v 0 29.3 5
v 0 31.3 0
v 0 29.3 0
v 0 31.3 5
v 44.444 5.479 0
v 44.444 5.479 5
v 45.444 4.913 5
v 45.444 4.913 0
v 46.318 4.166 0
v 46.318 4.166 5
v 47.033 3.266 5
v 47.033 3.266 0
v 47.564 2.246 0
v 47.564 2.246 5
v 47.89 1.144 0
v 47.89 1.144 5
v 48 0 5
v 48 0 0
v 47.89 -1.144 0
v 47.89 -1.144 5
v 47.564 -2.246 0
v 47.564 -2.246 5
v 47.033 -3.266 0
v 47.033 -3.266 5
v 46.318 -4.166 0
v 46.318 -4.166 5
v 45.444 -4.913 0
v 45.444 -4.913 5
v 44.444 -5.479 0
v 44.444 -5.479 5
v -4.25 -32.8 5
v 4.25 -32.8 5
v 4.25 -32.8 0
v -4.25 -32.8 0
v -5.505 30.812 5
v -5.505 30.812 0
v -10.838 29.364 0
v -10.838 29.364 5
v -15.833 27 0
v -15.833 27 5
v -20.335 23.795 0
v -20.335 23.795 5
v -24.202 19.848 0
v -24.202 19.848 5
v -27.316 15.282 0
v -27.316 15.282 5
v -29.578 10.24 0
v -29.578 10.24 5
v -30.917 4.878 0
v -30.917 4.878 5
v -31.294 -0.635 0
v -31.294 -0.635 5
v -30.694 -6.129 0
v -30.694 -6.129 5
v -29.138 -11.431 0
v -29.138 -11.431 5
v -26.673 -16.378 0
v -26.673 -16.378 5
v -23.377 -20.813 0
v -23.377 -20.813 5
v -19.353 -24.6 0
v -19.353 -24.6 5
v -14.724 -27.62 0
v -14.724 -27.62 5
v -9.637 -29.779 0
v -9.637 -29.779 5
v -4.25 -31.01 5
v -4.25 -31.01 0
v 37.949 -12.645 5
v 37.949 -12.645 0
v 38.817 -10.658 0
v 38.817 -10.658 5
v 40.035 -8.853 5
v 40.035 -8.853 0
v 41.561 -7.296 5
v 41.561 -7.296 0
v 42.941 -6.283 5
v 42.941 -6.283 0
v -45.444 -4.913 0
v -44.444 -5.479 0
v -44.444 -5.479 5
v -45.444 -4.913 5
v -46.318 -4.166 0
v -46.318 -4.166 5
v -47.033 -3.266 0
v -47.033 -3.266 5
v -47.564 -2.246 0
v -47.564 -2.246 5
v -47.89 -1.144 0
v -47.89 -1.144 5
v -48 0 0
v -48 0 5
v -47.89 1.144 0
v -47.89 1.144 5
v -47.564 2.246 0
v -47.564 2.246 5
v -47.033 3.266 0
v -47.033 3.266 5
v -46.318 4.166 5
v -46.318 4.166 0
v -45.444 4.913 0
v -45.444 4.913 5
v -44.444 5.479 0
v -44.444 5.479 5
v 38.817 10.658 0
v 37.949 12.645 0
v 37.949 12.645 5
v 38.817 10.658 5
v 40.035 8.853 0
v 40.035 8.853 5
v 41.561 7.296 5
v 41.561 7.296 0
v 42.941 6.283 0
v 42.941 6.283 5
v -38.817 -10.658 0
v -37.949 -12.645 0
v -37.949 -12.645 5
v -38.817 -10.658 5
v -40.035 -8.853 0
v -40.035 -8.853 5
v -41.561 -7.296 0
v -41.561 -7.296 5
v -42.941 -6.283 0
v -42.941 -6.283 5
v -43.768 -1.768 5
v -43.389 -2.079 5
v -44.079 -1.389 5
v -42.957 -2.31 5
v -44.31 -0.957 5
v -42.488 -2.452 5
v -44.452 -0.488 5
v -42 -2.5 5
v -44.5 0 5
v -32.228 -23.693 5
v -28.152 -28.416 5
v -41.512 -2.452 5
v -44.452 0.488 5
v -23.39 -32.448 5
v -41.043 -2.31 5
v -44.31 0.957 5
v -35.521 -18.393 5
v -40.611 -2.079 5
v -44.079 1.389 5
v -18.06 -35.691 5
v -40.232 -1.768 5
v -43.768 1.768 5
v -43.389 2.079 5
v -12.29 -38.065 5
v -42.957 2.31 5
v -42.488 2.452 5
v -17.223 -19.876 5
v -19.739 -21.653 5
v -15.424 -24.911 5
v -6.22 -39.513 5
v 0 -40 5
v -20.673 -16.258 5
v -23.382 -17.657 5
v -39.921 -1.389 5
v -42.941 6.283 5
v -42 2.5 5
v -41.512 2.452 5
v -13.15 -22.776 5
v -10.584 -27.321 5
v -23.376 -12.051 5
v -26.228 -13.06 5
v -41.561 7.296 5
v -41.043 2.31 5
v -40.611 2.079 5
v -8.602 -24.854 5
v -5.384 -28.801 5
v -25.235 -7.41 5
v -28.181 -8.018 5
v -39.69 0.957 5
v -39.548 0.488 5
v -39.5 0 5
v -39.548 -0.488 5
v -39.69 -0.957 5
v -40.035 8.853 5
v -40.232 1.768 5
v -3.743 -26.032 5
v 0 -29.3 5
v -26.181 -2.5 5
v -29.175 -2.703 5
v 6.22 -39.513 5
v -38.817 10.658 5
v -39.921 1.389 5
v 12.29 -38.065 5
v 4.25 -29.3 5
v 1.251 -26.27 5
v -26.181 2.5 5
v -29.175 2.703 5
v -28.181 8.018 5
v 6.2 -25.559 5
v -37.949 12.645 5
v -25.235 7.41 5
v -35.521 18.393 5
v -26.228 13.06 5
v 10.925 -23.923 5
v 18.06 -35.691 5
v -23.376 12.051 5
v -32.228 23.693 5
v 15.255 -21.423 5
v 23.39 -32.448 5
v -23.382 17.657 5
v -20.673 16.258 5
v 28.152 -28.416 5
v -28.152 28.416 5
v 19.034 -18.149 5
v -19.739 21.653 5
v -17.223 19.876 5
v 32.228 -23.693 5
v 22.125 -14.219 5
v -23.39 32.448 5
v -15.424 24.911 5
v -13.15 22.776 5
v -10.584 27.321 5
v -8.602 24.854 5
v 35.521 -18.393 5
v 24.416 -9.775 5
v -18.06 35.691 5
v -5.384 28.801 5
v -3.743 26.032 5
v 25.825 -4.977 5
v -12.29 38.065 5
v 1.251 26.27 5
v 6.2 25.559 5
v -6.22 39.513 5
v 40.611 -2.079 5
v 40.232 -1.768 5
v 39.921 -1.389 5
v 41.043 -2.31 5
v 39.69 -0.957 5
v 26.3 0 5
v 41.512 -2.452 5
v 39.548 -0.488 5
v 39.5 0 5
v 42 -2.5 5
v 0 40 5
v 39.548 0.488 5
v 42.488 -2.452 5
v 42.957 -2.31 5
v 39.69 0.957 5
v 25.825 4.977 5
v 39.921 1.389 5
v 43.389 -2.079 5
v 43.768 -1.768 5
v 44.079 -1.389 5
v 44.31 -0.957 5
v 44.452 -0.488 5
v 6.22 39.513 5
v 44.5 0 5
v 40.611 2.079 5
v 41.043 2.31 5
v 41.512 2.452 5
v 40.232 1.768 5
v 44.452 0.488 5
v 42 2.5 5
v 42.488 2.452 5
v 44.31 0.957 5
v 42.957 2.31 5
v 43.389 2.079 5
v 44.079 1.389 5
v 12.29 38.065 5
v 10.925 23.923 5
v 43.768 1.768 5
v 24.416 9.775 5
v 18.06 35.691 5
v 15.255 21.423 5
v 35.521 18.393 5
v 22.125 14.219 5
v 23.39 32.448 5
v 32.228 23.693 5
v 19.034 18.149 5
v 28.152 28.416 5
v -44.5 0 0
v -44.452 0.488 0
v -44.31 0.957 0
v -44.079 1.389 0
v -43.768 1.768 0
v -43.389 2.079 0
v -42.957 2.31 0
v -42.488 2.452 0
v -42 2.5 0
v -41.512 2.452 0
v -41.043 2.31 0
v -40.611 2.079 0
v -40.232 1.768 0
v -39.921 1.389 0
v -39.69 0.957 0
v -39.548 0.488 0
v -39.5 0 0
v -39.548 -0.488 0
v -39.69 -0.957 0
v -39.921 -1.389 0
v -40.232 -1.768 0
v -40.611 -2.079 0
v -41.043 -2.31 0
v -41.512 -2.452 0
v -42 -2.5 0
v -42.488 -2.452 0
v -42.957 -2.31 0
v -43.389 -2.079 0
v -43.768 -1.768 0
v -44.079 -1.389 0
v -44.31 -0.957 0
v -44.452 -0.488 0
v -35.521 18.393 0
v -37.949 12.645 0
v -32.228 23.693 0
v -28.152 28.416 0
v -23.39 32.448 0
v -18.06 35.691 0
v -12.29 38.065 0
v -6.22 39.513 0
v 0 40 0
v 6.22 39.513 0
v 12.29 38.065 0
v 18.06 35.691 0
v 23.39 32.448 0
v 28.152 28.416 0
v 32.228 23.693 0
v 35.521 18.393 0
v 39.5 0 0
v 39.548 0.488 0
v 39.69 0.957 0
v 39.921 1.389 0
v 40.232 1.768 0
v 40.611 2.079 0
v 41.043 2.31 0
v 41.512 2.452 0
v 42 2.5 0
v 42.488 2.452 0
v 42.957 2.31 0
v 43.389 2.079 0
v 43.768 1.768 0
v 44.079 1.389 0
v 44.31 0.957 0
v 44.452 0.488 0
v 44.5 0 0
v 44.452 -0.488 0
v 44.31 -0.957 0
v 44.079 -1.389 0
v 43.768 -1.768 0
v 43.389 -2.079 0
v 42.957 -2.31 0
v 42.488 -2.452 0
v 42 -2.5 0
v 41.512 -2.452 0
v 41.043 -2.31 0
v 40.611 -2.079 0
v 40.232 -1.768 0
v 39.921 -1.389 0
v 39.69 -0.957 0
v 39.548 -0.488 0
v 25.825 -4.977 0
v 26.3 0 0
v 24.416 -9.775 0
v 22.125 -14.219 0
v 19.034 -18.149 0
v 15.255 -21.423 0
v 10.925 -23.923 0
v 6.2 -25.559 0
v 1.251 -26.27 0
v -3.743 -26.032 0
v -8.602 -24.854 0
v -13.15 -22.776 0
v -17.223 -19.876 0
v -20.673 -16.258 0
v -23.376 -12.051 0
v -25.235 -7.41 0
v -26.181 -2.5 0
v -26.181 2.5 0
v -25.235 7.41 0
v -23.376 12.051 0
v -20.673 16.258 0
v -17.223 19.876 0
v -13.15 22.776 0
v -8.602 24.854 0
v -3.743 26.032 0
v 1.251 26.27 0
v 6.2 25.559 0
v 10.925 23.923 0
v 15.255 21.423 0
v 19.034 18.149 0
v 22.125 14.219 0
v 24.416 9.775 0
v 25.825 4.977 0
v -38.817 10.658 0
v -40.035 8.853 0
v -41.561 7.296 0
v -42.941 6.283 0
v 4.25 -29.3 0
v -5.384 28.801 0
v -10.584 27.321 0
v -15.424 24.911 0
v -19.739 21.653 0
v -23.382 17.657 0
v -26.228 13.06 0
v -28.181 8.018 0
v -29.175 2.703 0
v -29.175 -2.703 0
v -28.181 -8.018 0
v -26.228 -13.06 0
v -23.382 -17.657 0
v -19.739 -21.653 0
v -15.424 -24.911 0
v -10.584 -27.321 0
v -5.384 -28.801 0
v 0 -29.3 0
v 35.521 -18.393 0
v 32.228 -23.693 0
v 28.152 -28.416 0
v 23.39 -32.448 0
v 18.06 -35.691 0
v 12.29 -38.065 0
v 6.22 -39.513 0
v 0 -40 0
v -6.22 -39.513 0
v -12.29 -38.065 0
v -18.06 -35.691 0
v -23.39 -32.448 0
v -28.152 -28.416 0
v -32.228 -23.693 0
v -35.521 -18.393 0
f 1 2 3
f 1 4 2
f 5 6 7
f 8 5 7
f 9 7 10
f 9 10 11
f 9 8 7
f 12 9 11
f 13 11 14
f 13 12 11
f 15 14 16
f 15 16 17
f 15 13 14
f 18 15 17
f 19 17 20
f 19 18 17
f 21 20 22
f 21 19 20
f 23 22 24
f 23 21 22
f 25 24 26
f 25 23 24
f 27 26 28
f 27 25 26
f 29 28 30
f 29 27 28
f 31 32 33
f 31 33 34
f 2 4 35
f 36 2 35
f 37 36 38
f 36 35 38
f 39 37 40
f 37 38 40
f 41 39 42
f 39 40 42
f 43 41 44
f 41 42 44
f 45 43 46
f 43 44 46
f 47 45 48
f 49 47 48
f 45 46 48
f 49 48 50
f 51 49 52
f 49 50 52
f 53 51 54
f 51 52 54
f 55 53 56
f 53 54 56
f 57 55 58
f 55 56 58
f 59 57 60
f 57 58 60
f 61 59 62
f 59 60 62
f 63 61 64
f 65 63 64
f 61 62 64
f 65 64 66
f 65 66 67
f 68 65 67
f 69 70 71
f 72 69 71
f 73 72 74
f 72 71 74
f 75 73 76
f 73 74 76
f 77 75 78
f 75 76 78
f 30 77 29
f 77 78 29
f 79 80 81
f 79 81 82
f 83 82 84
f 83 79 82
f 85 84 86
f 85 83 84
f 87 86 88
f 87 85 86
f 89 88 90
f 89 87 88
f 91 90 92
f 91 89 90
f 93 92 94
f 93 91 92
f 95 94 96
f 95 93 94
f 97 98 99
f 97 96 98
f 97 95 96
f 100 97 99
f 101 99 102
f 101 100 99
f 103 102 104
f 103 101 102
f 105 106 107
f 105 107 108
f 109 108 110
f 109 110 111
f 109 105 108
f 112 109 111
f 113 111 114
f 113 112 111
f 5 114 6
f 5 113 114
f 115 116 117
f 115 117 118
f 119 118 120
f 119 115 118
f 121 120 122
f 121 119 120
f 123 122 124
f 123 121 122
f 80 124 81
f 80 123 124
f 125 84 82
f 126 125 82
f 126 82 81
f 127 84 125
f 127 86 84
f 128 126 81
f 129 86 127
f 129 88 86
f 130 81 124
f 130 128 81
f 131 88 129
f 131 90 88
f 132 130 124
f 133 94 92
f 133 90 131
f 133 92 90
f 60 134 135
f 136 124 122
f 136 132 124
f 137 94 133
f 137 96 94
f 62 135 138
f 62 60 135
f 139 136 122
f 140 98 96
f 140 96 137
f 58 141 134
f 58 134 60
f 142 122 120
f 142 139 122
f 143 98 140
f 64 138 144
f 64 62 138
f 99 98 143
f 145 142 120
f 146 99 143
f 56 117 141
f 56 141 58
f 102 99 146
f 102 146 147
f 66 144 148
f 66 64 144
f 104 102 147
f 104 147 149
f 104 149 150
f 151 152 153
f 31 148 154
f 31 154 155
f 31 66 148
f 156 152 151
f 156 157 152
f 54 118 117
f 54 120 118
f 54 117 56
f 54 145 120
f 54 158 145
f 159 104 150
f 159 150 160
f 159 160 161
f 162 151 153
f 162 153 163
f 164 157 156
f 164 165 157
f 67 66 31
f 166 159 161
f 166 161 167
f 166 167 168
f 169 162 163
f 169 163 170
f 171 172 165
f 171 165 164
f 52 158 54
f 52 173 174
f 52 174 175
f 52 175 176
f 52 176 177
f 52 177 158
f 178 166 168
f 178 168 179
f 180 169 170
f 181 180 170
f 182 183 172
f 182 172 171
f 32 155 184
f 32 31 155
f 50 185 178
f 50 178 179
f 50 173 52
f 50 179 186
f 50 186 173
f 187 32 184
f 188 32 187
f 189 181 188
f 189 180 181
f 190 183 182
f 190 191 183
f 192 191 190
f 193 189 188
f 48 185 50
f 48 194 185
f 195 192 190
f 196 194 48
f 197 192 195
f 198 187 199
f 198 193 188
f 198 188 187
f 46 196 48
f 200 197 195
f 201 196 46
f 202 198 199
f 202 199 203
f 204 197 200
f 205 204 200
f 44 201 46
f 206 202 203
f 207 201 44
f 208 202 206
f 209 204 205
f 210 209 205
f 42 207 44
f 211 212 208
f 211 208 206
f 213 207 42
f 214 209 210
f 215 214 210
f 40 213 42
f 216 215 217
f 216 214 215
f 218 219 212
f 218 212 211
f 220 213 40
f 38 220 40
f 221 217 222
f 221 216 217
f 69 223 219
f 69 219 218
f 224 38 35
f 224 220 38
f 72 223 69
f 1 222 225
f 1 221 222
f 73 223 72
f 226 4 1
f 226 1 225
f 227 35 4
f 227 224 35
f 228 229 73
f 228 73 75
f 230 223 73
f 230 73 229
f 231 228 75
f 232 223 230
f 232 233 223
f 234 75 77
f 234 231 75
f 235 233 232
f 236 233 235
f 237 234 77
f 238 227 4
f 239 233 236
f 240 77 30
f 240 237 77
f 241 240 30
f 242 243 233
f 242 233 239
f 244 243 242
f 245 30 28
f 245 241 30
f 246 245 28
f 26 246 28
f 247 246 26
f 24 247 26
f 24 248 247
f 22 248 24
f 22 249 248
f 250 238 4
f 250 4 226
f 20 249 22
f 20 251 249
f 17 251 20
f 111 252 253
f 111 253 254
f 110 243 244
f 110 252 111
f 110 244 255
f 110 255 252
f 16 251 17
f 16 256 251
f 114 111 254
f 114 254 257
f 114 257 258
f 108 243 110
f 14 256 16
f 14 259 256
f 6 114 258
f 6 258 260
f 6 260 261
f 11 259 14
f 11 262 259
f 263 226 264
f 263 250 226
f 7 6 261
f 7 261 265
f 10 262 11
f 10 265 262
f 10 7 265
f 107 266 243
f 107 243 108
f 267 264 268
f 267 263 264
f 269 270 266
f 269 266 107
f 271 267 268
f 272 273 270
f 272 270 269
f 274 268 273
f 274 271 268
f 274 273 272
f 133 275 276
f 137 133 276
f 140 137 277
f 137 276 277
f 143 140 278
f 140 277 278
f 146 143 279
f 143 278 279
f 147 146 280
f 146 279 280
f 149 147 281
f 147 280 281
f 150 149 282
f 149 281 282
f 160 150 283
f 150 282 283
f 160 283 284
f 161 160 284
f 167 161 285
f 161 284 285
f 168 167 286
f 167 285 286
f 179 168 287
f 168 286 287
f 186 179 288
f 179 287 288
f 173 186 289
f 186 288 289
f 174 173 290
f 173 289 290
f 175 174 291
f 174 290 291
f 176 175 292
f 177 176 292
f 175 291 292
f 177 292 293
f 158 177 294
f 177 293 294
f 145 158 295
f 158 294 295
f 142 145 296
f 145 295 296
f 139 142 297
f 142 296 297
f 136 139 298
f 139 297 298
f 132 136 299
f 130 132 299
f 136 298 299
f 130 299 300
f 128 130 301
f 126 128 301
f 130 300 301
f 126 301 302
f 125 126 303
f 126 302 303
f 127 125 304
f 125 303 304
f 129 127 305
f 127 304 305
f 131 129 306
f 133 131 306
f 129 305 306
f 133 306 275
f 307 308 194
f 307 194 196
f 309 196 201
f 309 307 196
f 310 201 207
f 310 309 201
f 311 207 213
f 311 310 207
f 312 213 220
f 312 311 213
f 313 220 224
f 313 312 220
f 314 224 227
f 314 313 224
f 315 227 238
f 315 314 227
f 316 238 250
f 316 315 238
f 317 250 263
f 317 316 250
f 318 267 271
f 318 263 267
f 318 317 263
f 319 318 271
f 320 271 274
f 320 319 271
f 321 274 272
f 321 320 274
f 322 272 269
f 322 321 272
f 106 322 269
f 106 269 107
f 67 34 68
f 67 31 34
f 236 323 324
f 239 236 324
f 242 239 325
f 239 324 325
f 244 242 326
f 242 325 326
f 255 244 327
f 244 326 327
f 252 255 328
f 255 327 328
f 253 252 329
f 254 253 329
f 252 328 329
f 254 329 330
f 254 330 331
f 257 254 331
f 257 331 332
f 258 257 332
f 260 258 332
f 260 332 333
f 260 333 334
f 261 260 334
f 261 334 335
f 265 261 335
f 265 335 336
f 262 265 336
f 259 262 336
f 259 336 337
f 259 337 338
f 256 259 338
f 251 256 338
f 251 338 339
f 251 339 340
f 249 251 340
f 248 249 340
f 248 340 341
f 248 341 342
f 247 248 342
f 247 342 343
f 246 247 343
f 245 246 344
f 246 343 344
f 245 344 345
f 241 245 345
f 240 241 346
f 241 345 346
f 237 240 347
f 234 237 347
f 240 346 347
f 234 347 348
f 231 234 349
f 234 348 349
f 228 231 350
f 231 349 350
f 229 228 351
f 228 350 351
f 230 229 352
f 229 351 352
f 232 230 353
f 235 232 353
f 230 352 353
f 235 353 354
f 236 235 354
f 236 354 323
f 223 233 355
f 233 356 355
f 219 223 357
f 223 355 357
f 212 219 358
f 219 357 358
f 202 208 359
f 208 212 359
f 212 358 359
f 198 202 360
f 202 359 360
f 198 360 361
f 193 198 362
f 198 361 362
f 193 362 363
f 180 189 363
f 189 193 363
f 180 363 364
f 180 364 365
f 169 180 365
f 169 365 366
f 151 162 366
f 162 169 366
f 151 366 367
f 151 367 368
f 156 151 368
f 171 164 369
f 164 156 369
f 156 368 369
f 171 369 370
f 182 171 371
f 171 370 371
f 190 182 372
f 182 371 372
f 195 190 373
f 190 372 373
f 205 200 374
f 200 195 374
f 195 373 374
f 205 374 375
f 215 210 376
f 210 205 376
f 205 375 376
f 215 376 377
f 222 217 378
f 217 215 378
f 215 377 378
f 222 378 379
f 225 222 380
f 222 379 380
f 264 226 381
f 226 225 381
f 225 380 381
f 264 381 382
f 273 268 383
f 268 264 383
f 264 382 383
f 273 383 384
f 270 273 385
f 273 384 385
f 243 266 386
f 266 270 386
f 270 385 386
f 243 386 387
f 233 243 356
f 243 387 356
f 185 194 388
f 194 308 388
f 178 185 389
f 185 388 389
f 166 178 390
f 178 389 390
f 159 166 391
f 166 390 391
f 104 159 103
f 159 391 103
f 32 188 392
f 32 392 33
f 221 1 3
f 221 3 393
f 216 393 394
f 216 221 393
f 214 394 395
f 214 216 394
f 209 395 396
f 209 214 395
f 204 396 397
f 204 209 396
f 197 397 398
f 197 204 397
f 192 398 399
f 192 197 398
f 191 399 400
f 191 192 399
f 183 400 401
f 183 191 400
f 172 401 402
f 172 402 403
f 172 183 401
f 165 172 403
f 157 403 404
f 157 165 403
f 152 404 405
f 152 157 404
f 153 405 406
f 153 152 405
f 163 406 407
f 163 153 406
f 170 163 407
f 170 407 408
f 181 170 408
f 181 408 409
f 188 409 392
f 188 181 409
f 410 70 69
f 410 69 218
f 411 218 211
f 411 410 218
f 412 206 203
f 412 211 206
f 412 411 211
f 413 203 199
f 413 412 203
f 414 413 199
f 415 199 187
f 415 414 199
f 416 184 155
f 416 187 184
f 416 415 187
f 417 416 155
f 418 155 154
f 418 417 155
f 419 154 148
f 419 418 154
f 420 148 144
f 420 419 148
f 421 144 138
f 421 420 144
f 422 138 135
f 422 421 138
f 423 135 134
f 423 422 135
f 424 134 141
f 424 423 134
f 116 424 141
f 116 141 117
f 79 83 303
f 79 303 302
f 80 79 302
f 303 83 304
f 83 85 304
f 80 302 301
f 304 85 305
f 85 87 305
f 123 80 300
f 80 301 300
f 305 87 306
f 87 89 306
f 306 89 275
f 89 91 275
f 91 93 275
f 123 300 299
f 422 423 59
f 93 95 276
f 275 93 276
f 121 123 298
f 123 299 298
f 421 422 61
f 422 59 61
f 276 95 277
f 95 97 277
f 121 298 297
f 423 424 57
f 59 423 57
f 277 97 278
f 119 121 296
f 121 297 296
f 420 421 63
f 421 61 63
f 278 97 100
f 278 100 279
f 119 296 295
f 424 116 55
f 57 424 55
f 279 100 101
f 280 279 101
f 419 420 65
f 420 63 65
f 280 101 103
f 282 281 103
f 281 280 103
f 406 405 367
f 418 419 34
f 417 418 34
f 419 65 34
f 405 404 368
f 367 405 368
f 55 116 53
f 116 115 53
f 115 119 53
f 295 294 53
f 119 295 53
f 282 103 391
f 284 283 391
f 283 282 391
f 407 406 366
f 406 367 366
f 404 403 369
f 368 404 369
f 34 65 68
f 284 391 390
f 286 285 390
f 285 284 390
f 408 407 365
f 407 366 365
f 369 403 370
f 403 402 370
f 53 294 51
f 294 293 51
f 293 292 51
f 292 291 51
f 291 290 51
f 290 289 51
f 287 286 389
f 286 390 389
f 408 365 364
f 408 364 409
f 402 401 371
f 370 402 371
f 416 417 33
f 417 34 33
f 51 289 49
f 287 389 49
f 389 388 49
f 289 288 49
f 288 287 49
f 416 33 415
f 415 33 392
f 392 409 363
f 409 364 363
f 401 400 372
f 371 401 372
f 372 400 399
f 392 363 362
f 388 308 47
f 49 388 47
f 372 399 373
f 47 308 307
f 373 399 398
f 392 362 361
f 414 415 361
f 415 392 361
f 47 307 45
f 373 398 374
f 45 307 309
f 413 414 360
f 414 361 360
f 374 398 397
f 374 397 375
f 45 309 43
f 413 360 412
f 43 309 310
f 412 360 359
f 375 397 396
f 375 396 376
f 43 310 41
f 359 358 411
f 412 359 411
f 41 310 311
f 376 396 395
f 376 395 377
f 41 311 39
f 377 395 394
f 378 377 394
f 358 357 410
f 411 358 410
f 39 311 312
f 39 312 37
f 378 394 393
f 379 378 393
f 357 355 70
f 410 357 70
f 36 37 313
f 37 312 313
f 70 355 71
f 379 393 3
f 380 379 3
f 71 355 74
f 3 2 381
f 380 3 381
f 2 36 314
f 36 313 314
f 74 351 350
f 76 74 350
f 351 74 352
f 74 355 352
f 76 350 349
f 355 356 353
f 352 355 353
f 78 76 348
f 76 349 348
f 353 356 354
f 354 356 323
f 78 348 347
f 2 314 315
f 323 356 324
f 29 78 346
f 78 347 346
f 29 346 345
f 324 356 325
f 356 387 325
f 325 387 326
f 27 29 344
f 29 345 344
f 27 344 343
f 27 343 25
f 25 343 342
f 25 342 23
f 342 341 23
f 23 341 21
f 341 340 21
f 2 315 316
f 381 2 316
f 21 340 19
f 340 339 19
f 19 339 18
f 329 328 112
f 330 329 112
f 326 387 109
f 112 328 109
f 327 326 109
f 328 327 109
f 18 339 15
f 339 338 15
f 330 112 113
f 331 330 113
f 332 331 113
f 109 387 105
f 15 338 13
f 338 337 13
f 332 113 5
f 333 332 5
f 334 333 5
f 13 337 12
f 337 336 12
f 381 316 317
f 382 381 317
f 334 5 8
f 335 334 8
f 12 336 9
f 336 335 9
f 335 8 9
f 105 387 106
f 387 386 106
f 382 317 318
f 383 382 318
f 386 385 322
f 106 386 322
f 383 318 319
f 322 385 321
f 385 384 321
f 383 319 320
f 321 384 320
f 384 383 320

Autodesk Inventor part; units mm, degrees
ref_plane "YZ Plane" through (0, 0, 0) normal (1, 0, 0) x (0, 1, 0)
ref_plane "XZ Plane" through (0, 0, 0) normal (0, 1, 0) x (-1, 0, 0)
ref_plane "XY Plane" through (0, 0, 0) normal (0, 0, 1) x (1, 0, 0)
sketch "Sketch1" plane through (0, 0, 0) normal (0, 0, 1) x (1, 0, 0)
  line L0 (0, 2.8582) -> (0, -2.8582) construction
  line L1 (-5.7775, 0) -> (5.7775, 0) construction
  circle A0 centre (0, 0) radius 26.3
  circle A1 centre (0, 0) radius 40
  line L2 (-40, 0) -> (-35, 0)
  circle A2 centre (-35, 0) radius 2.5
  line L3 (40, 0) -> (35, 0)
  circle A3 centre (35, 0) radius 2.5
  dimension "d0" = 52.6
  dimension "d1" = 80
  dimension "d4" = 5
  dimension "d5" = 5
  dimension "d6" = 5
  dimension "d7" = 5
extrude "Extrusion1" add sketch "Sketch1" along normal blind 5 contours A2 | A1 | A3
sketch "Sketch4" plane through (0, 0, 0) normal (0, 0, -1) x (-1, 0, 0)
  line L0 (0, 0) -> (-42, 0)
  line L1 (-42, 0) -> (42, 0)
  circle A0 centre (-42, 0) radius 2.5
  circle A1 centre (-42, 0) radius 6
  circle A2 centre (42, 0) radius 2.5
  circle A3 centre (42, 0) radius 6
  dimension "d19" = 42
  dimension "d20" = 84
  dimension "d21" = 5
  dimension "d22" = 12
  dimension "d23" = 5
  dimension "d24" = 12
extrude "Extrusion5" add sketch "Sketch4" against normal blind 5 contours A0 | A1 | A2 | A3
fillet "Fillet2" radius 12 4 edges at (39.619, -5.5074, 2.5) (39.619, 5.5074, 2.5) (-39.619, -5.5074, 2.5) (-39.619, 5.5074, 2.5)
extrude "Extrusion6" cut sketch "Sketch4" against normal blind 5 contours A0 | A2
sketch "Sketch5" plane through (0, 0, 5) normal (0, 0, 1) x (1, 0, 0)
  arc A0 (0, 29.3) -> (0, -29.3) centre (0, 0) ccw
  arc A1 (0, 31.3) -> (-4.25, -31.0101) centre (0, 0) ccw
  line L0 (0, 31.3) -> (0, 29.3)
  line L1 (0, -29.3) -> (4.25, -29.3)
  line L2 (4.25, -29.3) -> (4.25, -32.8)
  line L3 (4.25, -32.8) -> (-4.25, -32.8)
  line L4 (-4.25, -32.8) -> (-4.25, -31.0101)
  dimension "d30" = 29.3
  dimension "d31" = 31.3
  dimension "d32" = 4.25
  dimension "d33" = 3.5
  dimension "d34" = 8.5
extrude "Extrusion7" cut sketch "Sketch5" against normal blind 10
properties part number "Tussenplaat bevestiging axiale lager" material "S235"
